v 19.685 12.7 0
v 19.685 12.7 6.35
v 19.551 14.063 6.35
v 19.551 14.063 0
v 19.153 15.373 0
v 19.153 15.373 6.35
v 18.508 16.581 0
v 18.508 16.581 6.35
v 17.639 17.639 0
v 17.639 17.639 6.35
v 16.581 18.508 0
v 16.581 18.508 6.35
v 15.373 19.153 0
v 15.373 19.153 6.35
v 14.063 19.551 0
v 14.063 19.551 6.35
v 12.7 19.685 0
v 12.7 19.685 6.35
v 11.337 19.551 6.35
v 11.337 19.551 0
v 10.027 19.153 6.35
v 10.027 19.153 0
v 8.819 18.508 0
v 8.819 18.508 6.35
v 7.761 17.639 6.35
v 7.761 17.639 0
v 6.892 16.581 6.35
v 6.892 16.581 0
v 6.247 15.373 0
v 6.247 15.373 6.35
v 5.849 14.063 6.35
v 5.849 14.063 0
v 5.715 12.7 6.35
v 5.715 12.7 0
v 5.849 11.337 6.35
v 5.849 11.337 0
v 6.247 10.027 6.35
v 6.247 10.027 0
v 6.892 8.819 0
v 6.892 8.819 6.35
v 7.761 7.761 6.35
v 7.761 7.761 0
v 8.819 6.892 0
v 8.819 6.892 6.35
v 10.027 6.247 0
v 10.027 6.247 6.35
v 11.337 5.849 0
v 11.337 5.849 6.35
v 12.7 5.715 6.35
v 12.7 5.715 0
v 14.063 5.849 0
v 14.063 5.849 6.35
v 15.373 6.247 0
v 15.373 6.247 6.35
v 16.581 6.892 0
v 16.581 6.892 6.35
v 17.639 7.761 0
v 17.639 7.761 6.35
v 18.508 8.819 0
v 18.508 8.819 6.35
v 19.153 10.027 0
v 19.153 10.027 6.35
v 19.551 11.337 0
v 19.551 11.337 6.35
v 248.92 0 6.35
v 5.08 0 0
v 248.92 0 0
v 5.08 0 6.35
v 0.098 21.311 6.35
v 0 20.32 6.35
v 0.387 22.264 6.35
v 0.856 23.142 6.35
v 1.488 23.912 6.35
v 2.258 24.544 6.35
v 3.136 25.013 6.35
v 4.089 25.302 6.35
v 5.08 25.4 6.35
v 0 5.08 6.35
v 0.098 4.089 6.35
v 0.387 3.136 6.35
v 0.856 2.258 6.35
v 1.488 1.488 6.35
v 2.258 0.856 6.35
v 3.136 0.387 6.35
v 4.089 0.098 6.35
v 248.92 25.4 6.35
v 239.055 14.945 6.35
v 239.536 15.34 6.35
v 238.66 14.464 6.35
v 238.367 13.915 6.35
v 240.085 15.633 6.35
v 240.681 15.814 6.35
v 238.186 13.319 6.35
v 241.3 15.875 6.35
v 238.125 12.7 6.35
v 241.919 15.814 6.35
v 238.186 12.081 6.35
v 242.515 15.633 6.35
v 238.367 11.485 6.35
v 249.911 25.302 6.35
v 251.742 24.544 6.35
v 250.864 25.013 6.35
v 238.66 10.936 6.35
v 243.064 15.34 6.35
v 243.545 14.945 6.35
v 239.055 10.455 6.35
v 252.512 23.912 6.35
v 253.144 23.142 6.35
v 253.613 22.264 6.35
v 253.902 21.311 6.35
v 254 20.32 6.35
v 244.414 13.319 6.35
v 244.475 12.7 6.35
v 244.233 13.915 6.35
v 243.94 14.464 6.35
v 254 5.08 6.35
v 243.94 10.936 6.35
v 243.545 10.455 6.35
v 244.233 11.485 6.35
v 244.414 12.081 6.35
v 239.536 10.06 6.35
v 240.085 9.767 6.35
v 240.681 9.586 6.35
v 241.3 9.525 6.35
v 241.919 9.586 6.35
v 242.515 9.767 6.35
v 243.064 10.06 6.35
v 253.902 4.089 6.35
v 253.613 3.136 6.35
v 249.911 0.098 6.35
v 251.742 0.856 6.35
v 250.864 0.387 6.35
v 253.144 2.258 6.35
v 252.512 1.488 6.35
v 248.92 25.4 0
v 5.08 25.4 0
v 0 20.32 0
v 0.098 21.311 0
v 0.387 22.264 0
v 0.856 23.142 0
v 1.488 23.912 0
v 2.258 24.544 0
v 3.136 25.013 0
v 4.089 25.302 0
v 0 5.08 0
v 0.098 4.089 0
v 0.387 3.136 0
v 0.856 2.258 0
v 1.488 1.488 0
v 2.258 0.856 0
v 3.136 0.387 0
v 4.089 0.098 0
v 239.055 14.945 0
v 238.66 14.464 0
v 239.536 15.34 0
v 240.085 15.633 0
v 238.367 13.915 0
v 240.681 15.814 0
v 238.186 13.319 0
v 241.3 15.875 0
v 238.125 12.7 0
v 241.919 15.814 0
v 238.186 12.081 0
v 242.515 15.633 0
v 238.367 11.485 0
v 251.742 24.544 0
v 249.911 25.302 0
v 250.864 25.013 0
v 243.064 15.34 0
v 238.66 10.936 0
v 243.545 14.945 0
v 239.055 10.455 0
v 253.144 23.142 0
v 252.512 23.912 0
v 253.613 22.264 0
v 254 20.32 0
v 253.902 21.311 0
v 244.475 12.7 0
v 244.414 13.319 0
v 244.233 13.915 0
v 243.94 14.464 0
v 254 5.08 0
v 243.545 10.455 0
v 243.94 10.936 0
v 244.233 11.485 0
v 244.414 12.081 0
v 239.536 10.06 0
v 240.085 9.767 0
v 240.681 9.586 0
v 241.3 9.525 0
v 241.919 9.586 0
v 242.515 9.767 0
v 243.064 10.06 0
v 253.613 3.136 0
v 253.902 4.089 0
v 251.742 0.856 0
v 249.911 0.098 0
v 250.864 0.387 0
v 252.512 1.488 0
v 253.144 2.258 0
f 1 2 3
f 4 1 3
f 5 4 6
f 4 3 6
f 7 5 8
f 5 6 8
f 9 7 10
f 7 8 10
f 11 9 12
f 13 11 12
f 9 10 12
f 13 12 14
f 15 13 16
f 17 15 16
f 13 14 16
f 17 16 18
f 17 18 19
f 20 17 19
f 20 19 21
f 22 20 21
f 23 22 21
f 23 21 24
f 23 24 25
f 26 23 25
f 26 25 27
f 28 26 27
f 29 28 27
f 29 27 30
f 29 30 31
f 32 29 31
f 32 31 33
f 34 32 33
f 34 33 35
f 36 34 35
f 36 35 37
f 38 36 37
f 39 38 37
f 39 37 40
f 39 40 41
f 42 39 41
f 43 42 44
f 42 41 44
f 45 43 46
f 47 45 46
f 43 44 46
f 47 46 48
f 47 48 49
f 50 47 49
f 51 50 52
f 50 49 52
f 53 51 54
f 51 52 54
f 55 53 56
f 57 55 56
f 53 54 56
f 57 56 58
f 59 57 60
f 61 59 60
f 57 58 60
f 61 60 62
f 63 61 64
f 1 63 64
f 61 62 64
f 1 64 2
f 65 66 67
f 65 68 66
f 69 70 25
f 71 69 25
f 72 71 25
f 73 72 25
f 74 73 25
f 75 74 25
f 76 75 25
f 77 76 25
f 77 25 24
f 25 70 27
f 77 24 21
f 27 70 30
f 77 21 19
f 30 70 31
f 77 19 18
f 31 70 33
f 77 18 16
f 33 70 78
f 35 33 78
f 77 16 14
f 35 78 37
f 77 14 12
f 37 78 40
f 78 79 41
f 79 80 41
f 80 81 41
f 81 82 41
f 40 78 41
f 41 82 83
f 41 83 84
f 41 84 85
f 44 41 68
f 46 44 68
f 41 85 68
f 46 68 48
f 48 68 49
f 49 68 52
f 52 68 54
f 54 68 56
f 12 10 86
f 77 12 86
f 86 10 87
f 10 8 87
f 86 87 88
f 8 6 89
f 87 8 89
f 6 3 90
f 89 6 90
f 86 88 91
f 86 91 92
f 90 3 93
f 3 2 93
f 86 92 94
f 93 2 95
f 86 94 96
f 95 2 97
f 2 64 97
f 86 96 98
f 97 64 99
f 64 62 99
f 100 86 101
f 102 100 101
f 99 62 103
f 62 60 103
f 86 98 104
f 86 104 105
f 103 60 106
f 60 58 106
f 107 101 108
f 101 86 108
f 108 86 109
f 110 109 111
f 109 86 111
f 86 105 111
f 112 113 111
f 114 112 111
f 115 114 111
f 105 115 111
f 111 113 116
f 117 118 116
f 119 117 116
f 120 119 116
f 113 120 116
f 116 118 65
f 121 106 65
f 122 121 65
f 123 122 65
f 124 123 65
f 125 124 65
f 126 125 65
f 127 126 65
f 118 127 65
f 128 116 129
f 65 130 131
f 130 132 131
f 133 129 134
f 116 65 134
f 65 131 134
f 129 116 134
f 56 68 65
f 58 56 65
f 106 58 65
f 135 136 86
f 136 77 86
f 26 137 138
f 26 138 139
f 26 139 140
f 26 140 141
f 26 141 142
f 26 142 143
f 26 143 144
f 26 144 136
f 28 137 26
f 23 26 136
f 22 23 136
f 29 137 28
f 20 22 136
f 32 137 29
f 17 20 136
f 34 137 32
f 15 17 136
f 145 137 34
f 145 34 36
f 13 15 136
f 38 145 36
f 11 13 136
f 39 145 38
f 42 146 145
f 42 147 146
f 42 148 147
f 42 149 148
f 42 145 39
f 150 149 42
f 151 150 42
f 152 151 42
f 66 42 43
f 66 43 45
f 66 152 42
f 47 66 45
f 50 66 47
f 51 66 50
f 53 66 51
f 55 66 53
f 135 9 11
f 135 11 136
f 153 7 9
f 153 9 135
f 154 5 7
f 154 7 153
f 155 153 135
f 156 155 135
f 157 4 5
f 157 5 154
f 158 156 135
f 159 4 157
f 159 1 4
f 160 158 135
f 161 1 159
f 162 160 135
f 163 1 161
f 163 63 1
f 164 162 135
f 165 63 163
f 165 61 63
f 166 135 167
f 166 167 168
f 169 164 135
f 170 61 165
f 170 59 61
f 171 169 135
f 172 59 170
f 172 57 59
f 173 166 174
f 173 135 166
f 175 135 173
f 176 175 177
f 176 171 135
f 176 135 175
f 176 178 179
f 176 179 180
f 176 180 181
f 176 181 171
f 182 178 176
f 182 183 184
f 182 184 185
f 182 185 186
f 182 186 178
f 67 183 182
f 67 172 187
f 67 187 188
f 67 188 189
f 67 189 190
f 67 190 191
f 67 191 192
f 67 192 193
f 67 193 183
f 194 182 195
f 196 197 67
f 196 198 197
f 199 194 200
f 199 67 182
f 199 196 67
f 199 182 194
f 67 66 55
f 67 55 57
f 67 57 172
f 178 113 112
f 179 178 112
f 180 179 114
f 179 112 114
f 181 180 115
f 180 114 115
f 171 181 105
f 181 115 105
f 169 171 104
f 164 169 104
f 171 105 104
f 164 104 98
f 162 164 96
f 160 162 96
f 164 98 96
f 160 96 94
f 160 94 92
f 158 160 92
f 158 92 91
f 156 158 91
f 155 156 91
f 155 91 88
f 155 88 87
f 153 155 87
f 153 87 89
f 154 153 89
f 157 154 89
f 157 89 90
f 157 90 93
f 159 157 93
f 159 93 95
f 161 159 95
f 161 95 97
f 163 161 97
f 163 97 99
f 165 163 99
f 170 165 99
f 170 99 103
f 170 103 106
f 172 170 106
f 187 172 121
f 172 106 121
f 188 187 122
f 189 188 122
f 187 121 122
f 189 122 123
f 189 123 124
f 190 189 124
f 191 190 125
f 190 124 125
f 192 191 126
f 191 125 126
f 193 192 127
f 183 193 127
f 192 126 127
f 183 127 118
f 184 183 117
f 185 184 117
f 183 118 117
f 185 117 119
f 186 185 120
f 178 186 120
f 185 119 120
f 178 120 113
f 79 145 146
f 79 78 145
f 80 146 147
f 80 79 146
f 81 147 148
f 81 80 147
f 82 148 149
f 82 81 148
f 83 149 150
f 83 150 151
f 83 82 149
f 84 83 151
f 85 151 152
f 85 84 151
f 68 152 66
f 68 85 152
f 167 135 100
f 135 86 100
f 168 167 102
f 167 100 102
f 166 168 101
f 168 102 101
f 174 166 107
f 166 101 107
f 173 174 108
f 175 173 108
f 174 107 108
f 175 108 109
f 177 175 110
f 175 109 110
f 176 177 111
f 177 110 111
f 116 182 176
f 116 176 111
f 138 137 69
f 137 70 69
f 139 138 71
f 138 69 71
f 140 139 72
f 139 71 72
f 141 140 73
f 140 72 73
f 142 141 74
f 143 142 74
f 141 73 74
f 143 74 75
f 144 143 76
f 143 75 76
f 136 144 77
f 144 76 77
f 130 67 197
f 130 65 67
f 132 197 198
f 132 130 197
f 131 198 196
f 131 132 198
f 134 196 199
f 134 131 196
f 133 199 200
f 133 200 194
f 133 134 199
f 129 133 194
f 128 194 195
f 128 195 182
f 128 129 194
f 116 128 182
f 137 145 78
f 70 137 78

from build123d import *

# Parameters (mm, degrees)
F0_W     = 254
F0_H     = 6.35
F1_DEPTH = 25.4
F2_R     = 6.985
F2_R_2   = 3.175
F3_DEPTH = 25.4
F4_R     = 5.08


with BuildPart() as f1:
    # F0 (on Front) → F1 (new body)
    with BuildSketch(Plane.XZ):
        with Locations((127, 3.175)):
            Rectangle(F0_W, F0_H)
    extrude(amount=-F1_DEPTH)

    # F2 (on face) → F3 (cut)
    with BuildSketch(Plane.XY.offset(6.35)):
        with Locations((12.7, 12.7)):
            Circle(F2_R)
        with Locations((241.3, 12.7)):
            Circle(F2_R_2)
    extrude(amount=-F3_DEPTH, mode=Mode.SUBTRACT)

    # F4
    f4_edges = [f1.edges().sort_by_distance(p)[0] for p in [
        (254, 0, 3.175),
        (254, 25.4, 3.175),
        (0, 0, 3.175),
        (0, 25.4, 3.175),
    ]]
    fillet(f4_edges, radius=F4_R)


solid = f1.part
